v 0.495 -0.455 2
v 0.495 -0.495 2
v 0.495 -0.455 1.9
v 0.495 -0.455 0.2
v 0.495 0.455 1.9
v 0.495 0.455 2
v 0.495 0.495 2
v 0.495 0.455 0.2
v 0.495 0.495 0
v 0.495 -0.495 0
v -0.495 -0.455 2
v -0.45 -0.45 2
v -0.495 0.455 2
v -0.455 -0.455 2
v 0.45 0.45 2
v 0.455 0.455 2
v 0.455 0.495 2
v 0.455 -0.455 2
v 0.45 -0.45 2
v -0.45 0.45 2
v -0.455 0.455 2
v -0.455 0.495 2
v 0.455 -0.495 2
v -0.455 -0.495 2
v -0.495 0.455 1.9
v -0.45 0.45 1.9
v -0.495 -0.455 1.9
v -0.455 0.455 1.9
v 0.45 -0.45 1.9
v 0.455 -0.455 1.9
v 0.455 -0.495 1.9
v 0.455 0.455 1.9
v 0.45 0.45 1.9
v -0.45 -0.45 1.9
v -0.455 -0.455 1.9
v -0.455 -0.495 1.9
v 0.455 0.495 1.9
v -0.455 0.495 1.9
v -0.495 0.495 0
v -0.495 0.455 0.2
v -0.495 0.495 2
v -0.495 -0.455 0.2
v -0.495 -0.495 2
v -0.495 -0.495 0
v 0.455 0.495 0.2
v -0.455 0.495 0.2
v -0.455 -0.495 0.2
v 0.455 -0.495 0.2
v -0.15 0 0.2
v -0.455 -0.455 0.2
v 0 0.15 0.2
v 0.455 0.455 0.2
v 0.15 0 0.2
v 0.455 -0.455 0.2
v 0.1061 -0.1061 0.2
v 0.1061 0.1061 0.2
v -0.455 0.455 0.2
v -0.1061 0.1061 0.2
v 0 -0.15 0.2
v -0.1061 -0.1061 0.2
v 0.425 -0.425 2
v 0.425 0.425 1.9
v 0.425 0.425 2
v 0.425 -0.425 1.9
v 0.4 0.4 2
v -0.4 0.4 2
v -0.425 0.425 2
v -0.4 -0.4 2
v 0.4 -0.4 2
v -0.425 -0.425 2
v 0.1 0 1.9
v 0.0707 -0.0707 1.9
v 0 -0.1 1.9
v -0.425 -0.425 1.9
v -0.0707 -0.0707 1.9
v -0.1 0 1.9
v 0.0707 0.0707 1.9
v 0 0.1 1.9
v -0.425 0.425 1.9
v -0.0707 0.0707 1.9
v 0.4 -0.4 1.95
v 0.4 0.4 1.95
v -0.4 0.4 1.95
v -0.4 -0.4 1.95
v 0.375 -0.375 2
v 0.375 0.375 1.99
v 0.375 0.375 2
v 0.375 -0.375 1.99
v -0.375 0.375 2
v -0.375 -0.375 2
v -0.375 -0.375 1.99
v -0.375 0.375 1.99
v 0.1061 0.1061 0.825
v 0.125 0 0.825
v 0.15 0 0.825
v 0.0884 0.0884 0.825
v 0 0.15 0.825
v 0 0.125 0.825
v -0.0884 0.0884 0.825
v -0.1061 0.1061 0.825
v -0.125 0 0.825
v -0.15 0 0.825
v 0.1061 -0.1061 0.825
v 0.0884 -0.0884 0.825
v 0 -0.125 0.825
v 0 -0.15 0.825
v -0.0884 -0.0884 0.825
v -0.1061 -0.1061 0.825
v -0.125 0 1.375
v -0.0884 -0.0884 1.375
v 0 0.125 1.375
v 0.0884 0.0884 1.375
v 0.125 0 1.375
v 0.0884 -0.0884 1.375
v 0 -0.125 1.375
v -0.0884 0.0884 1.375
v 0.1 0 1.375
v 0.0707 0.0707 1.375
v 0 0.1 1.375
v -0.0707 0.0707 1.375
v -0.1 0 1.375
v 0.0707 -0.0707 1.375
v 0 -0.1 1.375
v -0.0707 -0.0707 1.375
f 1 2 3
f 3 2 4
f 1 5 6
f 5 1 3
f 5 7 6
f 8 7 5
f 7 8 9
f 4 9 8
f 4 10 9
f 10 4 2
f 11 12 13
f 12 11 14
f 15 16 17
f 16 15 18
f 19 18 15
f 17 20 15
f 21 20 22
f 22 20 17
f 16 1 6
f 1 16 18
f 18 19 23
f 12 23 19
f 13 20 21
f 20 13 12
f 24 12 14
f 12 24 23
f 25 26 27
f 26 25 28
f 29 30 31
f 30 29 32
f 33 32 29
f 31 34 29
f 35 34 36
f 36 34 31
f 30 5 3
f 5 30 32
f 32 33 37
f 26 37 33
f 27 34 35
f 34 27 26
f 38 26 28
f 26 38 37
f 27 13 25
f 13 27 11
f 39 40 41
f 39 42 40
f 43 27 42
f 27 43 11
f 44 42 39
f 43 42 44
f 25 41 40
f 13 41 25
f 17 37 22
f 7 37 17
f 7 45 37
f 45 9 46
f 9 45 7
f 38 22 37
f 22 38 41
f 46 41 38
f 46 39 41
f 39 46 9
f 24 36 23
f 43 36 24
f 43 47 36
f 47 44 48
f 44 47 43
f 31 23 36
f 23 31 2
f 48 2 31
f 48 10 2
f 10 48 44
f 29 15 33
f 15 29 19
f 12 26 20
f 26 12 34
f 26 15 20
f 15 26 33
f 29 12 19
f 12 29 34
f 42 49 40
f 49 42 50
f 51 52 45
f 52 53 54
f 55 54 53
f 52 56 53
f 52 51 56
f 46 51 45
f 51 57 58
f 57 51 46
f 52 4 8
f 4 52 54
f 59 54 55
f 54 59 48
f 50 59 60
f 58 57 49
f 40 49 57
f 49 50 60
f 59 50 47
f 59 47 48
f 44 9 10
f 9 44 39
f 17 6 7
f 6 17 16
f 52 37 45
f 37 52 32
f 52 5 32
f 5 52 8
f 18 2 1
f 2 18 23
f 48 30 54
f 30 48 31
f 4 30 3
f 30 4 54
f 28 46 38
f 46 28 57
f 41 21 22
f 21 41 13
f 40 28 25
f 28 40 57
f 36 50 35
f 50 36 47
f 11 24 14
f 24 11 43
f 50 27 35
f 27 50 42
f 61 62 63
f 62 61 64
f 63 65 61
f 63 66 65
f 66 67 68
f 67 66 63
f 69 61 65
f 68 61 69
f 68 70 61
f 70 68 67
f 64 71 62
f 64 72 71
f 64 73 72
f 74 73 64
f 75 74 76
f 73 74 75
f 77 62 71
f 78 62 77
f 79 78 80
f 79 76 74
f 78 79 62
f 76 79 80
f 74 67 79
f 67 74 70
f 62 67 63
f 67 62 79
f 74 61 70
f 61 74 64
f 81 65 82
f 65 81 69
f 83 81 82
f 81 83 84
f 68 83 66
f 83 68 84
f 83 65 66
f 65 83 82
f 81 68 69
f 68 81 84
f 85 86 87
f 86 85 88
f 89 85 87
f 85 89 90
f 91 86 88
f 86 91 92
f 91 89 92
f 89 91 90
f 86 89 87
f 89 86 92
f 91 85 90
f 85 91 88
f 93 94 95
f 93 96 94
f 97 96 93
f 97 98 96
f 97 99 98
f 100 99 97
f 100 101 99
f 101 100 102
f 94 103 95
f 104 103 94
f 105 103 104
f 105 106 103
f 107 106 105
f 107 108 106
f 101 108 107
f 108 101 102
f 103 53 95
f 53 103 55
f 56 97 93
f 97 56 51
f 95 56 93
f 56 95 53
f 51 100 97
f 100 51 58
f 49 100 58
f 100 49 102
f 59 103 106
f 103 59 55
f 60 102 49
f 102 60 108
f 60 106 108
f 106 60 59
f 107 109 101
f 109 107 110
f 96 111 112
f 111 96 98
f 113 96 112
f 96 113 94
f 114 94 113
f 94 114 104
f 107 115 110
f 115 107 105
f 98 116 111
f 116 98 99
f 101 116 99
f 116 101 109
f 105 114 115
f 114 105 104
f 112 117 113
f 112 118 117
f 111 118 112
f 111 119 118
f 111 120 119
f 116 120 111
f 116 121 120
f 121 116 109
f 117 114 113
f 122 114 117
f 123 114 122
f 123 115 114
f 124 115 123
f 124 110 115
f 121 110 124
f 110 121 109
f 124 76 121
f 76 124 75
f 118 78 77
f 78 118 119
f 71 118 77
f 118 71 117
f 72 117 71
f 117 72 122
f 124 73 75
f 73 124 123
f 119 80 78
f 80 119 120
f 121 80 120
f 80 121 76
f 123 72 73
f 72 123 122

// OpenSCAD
// file: lib.scad
function x(v) = v[0];
function y(v) = v[1];
function z(v) = v[2];
function add(v1,v2) = [ for (i = [ 0 : len(v1)-1 ]) v1[i] + v2[i] ];
function xv(d) = [d,0,0];
function yv(d) = [0,d,0];
function zv(d) = [0,0,d];

module box(v) { cube(size=v, center=true); }
module cyl(r1,r2,h) { cylinder(r1=r1, r2=r2, h=h, center=true); }

function grow(n,v) = [x(v)+n*2, y(v)+n*2, z(v)+n*2];

module rbox(v, radius=1) {
	cx = x(v)/2-radius;
	cy = y(v)/2-radius;
	cz = z(v)/2-radius;

	hull() {
		translate([cx,cy,cz]) sphere(r=radius);
		translate([cx,cy,-cz]) sphere(r=radius);
		translate([cx,-cy,cz]) sphere(r=radius);
		translate([cx,-cy,-cz]) sphere(r=radius);
		translate([-cx,cy,cz]) sphere(r=radius);
		translate([-cx,cy,-cz]) sphere(r=radius);
		translate([-cx,-cy,cz]) sphere(r=radius);
		translate([-cx,-cy,-cz]) sphere(r=radius);
	}
}

module fillet(r=1) {
  minkowski() {
    difference() {
      children();
      minkowski() {
        difference() {
          minkowski() {
            children();
            sphere(r=r);
          }
          children();
        }
        sphere(r=r);
      }
    }
    sphere(r=r);
  }
}
// main file
use <lib.scad>

module frame() {
	union() {
		translate([0,0,0.1]) box([0.99, 0.99, 0.2]);
		translate([0,0,1.95]) difference() {
			box([0.99, 0.99, 0.1]);
			box([0.9, 0.9, 0.15]);
		}
		translate([0.475,0.475,1.0]) box([0.04, 0.04, 2.0]);
		translate([0.475,-0.475,1.0]) box([0.04, 0.04, 2.0]);
		translate([-0.475,0.475,1.0]) box([0.04, 0.04, 2.0]);
		translate([-0.475,-0.475,1.0]) box([0.04, 0.04, 2.0]);
	}
}

module platform() {
	translate([0,0,1.95]) difference() {
		box([0.85, 0.85, 0.1]);
		translate([0,0,0.05]) box([0.8, 0.8, 0.1]);
	}
}

module surface() {
	translate([0,0,1.995]) box([0.75, 0.75, 0.01]);
}

module telescope1() {
	#translate([0,0,0.5]) cyl(0.15, 0.15, 0.65);
}

module telescope2() {
	#translate([0,0,1.05]) cyl(0.125, 0.125, 0.65);
}

module telescope3() {
	#translate([0,0,1.6]) cyl(0.10, 0.10, 0.65);
}

d = 8;

//fillet(0.01, $fn=$fn/8) frame($fn=d);
frame($fn=d);

//fillet(0.01, $fn=$fn/8) platform($fn=d);
platform($fn=d);
surface($fn=d);

telescope1($fn=d);
telescope2($fn=d);
telescope3($fn=d);
